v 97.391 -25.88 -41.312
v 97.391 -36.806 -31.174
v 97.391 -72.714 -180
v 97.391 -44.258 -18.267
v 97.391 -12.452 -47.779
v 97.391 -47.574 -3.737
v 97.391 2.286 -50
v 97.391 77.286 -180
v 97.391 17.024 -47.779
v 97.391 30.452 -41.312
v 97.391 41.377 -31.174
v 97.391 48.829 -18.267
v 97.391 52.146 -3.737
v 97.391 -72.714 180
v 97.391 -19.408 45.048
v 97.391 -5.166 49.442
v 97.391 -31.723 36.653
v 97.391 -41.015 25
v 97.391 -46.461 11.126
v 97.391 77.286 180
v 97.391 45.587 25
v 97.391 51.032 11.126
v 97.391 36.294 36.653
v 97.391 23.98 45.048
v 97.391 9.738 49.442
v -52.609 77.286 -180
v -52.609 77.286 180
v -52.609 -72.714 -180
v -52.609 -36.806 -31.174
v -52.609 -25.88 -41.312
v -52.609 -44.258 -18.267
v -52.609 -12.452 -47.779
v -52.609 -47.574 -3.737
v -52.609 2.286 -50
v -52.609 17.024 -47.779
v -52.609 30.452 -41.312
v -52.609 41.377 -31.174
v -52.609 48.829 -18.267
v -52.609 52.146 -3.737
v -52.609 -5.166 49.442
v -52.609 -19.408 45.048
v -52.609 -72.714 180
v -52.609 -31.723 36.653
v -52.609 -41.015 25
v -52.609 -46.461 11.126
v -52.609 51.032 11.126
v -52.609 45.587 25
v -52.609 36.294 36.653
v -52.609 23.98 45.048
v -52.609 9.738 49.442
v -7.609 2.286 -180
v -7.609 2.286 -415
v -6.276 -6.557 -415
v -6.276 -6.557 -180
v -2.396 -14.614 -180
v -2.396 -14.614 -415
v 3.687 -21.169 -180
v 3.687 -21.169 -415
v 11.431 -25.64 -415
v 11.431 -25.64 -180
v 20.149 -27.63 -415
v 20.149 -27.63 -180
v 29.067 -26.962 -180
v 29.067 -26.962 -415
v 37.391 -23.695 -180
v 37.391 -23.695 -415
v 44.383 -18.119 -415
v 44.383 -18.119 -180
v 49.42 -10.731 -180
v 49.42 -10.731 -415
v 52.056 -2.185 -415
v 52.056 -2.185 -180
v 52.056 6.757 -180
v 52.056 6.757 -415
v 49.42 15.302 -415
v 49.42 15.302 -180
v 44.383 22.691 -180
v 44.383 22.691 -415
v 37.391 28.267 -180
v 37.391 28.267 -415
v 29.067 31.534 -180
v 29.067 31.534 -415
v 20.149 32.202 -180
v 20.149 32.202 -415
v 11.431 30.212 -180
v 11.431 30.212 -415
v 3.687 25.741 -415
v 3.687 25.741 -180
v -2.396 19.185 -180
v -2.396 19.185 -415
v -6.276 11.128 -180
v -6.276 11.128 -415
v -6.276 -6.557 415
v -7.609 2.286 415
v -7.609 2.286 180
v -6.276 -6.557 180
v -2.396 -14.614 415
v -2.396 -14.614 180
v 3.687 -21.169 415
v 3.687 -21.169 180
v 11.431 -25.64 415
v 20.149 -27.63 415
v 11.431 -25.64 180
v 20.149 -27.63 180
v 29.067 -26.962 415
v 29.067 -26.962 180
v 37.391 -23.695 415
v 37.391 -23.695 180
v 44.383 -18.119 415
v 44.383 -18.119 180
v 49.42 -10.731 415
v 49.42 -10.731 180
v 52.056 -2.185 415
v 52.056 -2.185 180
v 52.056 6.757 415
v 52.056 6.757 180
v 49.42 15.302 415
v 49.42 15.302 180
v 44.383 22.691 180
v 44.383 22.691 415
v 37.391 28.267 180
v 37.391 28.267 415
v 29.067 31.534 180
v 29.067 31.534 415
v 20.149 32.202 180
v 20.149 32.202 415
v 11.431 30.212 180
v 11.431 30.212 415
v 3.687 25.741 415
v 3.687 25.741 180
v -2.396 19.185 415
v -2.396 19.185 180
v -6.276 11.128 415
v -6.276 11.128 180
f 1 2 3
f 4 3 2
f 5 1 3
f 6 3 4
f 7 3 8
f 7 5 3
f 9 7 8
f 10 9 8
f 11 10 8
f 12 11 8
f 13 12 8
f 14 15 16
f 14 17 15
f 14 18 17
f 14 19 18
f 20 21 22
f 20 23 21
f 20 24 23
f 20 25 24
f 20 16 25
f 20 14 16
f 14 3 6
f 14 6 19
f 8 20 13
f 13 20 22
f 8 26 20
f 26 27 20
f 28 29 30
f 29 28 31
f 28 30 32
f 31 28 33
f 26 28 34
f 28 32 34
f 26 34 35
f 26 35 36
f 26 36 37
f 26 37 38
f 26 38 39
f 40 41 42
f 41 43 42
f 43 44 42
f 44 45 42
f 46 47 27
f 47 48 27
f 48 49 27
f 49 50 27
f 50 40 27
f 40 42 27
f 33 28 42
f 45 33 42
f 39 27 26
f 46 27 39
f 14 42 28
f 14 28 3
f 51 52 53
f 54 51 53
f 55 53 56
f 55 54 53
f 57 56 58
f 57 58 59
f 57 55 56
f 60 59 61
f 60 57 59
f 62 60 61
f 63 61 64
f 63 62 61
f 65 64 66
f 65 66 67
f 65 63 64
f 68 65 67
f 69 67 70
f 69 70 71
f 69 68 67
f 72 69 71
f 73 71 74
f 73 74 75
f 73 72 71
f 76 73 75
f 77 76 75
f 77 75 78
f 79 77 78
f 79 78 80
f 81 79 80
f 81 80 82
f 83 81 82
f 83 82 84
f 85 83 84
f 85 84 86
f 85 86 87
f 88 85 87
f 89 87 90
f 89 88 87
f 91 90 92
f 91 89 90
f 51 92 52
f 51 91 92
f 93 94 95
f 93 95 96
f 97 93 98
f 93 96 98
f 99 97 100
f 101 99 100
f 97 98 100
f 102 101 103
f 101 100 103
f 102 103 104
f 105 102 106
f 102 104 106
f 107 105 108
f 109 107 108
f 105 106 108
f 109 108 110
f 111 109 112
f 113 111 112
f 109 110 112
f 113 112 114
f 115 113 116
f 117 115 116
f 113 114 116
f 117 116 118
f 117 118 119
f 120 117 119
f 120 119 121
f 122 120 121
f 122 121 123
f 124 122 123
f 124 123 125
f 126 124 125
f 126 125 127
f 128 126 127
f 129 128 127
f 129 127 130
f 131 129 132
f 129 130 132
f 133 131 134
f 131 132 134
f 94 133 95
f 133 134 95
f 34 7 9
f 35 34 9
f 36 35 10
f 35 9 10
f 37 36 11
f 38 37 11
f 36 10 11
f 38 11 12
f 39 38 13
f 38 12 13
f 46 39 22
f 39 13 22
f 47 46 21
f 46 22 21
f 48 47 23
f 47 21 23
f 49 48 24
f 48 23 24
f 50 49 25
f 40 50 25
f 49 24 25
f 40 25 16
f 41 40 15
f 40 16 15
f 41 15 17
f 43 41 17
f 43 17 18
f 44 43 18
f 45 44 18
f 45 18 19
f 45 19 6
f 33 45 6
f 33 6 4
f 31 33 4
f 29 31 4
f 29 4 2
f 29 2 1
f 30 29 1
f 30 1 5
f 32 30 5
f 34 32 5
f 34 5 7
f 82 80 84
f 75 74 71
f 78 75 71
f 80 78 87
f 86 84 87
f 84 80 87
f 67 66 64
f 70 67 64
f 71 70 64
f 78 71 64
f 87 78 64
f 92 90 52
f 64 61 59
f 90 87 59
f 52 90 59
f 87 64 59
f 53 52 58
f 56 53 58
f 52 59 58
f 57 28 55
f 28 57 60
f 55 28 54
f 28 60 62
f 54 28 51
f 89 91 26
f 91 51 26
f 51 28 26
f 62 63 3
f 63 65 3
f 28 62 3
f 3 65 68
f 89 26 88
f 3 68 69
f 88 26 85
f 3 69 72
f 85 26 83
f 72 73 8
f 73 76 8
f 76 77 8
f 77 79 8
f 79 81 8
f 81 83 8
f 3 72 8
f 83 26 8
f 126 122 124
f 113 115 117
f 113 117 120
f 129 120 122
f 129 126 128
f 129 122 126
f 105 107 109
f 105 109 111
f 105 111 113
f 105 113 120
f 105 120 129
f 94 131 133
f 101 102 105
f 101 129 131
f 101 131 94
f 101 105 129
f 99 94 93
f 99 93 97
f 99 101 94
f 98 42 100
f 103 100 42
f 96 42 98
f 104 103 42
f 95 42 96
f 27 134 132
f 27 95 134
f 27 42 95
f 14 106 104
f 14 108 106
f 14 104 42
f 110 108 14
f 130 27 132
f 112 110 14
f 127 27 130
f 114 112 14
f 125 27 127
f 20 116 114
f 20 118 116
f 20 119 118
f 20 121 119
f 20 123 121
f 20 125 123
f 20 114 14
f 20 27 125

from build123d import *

# Parameters (mm, degrees)
SKETCH2_W           = 150
SKETCH2_H           = 150
BOSS_EXTRUDE1_DEPTH = 180
SKETCH5_R           = 30
BOSS_EXTRUDE3_DEPTH = 235
SKETCH7_R           = 50
CUT_EXTRUDE1_DEPTH  = 448.993409814


with BuildPart() as part:
    # Sketch2 → Boss-Extrude1 (new body)
    with BuildSketch(Plane.XY):
        with Locations((22.391402768, 2.285802295)):
            Rectangle(SKETCH2_W, SKETCH2_H)
    boss_extrude1 = extrude(amount=BOSS_EXTRUDE1_DEPTH)

    # Sketch5 → Boss-Extrude3 (add)
    with BuildSketch(Plane.XY.offset(180)):
        with Locations(Location((22.391402768, 2.285802295, 0), (0, 0, 180))):
            Circle(SKETCH5_R)
    boss_extrude3 = extrude(amount=BOSS_EXTRUDE3_DEPTH)

    # Mirror1: Boss-Extrude1, Boss-Extrude3 across plane
    add(boss_extrude1.mirror(Plane.XY))
    add(boss_extrude3.mirror(Plane.XY))

    # Sketch7 → Cut-Extrude1 (cut, through all)
    with BuildSketch(Plane(origin=(97.391402768, 0, 0), x_dir=(0, 0, -1), z_dir=(1, 0, 0))):
        with Locations((0, 2.285802295)):
            Circle(SKETCH7_R)
    extrude(amount=-CUT_EXTRUDE1_DEPTH, mode=Mode.SUBTRACT)


solid = part.part
